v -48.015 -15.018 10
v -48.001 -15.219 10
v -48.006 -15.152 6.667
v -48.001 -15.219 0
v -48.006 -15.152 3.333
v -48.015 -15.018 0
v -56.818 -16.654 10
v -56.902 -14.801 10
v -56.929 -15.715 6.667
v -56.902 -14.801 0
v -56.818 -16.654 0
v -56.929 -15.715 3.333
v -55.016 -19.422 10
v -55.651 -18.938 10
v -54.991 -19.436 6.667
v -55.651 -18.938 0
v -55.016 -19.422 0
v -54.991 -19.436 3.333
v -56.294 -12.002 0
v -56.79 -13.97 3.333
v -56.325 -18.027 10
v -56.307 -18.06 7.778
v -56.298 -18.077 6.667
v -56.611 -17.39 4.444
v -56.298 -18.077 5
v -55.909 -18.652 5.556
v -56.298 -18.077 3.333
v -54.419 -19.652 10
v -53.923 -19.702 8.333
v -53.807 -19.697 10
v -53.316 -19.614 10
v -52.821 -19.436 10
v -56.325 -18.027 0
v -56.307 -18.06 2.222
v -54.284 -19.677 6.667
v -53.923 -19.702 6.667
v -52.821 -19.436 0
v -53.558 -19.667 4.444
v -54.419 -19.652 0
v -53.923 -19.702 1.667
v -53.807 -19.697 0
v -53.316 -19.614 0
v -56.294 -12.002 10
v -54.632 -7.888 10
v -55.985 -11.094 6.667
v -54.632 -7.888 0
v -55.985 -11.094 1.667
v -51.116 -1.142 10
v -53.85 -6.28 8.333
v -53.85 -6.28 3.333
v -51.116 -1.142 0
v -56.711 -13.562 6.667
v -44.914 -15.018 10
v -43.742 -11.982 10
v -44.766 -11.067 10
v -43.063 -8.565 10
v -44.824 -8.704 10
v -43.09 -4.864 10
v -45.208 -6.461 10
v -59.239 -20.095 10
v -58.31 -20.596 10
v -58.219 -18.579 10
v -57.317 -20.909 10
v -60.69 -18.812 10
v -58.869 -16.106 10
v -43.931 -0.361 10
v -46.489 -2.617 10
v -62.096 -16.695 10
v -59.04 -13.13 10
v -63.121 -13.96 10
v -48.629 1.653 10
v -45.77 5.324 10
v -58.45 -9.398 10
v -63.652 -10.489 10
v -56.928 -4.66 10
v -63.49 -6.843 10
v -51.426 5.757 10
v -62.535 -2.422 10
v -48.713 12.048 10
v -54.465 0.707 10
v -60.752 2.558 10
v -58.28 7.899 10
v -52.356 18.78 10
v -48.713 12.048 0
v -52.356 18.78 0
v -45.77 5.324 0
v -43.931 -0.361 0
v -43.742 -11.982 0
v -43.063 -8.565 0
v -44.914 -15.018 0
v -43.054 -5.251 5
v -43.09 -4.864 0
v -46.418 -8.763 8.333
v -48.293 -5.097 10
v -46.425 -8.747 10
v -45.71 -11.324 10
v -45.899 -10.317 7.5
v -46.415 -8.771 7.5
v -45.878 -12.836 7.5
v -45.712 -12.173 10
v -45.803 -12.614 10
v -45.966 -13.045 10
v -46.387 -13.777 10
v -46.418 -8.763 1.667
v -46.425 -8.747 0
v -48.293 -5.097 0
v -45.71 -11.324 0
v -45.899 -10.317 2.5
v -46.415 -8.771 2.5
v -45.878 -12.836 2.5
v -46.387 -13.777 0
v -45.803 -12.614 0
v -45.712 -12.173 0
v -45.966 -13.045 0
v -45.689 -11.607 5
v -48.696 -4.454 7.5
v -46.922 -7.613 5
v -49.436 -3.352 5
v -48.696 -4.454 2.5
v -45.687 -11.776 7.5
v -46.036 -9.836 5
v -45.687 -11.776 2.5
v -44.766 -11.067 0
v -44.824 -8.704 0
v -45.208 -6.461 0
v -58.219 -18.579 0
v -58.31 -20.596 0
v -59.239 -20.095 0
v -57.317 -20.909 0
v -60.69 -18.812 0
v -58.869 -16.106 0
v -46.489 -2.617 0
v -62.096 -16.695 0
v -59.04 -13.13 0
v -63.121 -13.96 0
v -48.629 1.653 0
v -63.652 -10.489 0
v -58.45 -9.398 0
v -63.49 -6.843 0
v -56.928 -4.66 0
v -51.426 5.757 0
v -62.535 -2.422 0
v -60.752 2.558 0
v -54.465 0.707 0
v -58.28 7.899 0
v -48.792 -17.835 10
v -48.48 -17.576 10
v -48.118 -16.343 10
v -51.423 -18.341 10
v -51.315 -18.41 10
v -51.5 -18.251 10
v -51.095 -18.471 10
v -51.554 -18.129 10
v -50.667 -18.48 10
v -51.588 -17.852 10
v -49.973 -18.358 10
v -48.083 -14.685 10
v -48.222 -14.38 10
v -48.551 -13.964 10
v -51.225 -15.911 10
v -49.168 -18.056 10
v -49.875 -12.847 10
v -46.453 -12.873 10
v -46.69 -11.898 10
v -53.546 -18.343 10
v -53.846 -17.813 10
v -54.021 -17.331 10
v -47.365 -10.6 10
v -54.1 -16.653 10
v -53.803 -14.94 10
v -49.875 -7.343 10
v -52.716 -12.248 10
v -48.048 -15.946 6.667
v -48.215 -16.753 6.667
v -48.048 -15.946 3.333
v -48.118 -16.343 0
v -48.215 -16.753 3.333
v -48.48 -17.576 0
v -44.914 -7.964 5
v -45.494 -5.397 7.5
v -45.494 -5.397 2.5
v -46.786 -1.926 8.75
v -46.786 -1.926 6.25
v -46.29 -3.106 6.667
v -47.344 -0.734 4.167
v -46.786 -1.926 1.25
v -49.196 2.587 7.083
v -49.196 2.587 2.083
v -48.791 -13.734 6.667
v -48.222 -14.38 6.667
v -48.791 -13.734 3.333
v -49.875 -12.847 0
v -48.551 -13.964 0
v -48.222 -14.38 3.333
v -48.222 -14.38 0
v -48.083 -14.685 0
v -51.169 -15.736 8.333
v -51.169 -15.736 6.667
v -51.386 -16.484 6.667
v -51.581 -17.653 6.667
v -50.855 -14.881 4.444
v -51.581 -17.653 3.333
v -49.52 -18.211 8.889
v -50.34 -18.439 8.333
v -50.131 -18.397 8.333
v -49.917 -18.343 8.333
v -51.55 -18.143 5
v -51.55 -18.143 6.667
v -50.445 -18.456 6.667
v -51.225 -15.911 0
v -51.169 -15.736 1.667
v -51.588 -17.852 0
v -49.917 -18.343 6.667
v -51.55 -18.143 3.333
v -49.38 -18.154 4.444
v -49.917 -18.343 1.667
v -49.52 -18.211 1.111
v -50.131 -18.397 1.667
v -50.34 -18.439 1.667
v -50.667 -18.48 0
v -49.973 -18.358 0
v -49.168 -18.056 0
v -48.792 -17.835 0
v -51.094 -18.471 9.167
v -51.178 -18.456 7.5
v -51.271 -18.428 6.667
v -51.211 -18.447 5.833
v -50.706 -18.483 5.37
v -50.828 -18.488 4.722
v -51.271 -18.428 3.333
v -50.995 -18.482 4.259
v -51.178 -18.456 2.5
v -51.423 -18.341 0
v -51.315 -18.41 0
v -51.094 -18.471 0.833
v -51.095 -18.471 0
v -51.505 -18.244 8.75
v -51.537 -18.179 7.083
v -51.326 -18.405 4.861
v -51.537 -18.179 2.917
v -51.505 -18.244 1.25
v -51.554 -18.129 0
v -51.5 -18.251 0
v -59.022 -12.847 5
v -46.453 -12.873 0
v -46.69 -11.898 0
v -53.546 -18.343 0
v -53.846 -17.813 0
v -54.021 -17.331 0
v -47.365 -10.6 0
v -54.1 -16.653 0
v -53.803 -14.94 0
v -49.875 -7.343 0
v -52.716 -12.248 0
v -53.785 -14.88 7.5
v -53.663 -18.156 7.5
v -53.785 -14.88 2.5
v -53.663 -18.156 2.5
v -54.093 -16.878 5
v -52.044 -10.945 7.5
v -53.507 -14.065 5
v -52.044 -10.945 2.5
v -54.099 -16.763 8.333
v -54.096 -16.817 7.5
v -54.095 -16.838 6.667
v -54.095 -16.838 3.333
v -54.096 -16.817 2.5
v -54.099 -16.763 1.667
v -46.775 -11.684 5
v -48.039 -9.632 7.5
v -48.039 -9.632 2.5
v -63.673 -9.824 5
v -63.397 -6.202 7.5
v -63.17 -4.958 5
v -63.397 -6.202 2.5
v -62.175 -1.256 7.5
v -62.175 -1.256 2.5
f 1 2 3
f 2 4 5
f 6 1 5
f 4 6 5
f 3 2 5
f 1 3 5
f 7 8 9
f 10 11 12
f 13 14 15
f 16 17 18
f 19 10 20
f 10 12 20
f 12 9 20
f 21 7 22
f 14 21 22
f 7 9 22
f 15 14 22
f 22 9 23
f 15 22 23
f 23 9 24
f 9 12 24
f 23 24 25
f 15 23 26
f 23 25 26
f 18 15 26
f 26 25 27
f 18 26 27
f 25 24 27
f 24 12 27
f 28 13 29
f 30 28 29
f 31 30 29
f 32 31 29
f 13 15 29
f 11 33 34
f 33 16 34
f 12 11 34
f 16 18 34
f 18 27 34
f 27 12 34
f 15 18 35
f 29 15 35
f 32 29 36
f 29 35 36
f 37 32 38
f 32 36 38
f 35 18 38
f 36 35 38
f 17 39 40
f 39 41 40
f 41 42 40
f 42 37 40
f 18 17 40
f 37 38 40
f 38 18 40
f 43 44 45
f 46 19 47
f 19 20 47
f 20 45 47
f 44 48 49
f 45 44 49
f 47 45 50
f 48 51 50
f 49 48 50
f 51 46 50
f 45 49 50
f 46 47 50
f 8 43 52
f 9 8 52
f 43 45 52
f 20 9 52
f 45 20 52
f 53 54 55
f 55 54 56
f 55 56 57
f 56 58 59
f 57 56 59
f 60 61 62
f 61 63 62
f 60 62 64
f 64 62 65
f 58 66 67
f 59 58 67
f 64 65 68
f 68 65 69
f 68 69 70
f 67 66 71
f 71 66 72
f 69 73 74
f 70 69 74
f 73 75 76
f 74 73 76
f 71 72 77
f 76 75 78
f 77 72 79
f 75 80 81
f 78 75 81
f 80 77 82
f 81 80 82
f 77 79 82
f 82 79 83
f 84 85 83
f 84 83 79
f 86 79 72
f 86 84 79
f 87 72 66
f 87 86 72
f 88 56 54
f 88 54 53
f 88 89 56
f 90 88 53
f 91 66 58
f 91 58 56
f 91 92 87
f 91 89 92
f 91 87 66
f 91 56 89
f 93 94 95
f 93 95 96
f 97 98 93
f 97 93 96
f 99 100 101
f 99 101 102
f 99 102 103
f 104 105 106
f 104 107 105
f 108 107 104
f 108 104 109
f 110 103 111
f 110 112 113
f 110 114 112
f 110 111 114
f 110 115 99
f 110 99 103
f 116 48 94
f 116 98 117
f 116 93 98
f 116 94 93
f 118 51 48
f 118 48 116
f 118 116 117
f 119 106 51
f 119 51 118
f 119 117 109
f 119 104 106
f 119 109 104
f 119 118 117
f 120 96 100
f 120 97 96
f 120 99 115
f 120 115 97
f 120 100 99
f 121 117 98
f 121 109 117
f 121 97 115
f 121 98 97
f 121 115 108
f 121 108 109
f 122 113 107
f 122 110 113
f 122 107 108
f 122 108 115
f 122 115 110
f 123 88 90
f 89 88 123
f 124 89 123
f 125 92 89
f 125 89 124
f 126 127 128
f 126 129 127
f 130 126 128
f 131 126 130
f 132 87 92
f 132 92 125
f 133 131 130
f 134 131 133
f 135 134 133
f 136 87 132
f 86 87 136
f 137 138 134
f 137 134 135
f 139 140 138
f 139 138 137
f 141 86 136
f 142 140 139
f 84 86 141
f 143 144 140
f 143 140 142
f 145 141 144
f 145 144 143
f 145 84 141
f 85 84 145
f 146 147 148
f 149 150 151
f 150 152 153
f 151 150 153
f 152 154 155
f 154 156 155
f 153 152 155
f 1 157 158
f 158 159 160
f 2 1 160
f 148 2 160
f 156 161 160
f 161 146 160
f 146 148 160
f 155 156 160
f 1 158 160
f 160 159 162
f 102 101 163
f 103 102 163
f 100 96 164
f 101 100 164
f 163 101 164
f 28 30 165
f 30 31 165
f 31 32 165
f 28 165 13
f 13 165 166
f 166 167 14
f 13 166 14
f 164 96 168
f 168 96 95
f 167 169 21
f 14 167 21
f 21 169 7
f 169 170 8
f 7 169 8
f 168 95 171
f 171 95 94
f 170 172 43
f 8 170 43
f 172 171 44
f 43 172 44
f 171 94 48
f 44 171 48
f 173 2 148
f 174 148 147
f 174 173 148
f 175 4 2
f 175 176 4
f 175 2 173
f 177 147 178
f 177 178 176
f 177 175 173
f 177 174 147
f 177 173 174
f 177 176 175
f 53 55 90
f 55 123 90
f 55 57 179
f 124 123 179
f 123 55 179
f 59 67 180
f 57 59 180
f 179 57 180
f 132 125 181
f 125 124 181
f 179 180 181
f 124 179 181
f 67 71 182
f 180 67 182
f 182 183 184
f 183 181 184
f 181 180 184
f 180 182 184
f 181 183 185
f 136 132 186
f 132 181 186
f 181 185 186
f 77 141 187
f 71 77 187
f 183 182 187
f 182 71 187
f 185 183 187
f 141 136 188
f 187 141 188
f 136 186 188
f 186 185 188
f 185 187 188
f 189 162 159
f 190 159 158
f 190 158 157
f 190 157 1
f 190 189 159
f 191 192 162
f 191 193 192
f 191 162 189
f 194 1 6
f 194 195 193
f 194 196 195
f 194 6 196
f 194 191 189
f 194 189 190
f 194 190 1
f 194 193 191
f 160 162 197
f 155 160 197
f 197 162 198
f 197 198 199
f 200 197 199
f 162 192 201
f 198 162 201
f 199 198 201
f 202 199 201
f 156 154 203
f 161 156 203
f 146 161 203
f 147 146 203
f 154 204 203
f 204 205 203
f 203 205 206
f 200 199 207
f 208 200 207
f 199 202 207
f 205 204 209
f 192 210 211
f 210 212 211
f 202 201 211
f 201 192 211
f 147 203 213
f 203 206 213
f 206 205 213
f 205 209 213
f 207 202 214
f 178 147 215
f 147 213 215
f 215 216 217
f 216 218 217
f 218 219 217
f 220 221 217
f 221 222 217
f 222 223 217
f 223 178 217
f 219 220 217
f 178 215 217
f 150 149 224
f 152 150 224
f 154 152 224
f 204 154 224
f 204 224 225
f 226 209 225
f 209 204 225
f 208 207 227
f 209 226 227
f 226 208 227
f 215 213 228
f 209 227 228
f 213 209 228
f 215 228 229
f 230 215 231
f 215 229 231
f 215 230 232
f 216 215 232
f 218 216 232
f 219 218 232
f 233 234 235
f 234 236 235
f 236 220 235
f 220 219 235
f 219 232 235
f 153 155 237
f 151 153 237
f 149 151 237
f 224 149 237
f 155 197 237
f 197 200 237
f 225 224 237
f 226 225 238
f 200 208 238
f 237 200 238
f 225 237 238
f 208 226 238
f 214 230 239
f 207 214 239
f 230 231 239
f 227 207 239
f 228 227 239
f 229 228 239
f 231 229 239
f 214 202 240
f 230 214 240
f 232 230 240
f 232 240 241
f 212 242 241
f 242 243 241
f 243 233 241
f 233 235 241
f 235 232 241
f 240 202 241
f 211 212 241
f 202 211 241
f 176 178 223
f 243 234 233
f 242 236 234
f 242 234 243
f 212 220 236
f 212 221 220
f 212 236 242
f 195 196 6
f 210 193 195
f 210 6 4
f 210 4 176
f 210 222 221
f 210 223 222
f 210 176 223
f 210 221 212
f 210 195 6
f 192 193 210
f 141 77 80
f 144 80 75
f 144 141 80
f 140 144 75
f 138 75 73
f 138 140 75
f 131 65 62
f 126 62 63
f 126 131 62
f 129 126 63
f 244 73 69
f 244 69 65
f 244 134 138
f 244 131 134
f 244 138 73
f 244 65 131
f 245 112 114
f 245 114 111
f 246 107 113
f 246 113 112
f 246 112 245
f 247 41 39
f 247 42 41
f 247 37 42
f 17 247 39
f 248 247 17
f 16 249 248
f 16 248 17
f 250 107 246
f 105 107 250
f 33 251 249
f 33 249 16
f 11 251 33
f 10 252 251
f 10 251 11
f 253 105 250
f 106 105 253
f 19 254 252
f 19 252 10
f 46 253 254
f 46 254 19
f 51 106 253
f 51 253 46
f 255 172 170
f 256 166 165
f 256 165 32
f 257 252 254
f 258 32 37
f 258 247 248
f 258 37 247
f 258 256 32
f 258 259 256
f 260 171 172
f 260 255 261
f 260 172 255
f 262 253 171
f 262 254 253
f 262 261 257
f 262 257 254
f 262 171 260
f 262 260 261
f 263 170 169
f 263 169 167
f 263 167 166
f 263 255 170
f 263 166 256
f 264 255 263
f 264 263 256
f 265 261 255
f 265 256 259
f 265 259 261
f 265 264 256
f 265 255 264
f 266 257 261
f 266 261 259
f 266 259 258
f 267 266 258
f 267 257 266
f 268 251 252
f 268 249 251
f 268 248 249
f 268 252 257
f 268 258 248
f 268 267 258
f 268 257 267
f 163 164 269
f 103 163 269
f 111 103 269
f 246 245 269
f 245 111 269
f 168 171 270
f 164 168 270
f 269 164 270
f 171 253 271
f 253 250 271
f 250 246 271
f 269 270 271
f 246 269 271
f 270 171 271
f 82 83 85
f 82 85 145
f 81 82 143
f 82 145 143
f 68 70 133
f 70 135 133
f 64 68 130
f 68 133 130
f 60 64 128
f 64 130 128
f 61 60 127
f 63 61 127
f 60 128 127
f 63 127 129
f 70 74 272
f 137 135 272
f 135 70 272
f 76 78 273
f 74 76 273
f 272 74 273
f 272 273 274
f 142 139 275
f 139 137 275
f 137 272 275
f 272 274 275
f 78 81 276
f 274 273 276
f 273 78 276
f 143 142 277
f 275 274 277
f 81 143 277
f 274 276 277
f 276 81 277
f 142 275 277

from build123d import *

# Parameters (mm, degrees)
F1_DEPTH = 10


with BuildPart() as f1:
    # F0 (on Top) → F1 (new body)
    with BuildSketch(Plane.XY):
        with BuildLine():
            add(Edge.make_bspline(
                [(-52.3558855057, 18.7795050442), (-47.4479237009, 10.4973188077), (-41.2077429849, -4.5023856475), (-43.6520873473, -12.2564412052), (-44.9143238366, -15.0175821036)],
                knots=[0, 0, 0, 0, 0.6168364814, 1, 1, 1, 1], degree=3))
            add(Edge.make_bspline(
                [(-52.3558855057, 18.7795050442), (-57.9370558262, 8.8574243709), (-67.5663953849, -7.8461265909), (-61.0377043486, -20.1336536556), (-57.3169253767, -20.9088176489)],
                knots=[0, 0, 0, 0, 0.6080836152, 1, 1, 1, 1], degree=3))
            add(Edge.make_bspline(
                [(-51.4256879687, 5.7567739859), (-55.3790181875, 0), (-60.7427232824, -12.5683599261), (-58.3128306392, -18.4721705598), (-57.3169253767, -20.9088176489)],
                knots=[0, 0, 0, 0, 0.6096241329, 1, 1, 1, 1], degree=3))
            add(Edge.make_bspline(
                [(-51.4256879687, 5.7567739859), (-47.9944117315, 1.4104907139), (-43.8064596306, -7.6148778158), (-44.9937747455, -12.792945198), (-44.9143238366, -15.0175821036)],
                knots=[0, 0, 0, 0, 0.5946990697, 1, 1, 1, 1], degree=3))
        make_face()
    extrude(amount=F1_DEPTH)


with BuildPart() as f1b:
    # F0 (on Top) → F1, piece 2 (new body)
    with BuildSketch(Plane.XY):
        with BuildLine():
            add(Edge.make_bspline(
                [(-51.1156246066, -1.1421727249), (-47.8599406779, -5.0955014303), (-44.8619365743, -11.2527871762), (-45.9975858714, -13.1776298191), (-46.3871322572, -13.7773221359)],
                knots=[0, 0, 0, 0, 0.6945515009, 1, 1, 1, 1], degree=3))
            add(Edge.make_bspline(
                [(-51.1156246066, -1.1421727249), (-54.0927626245, -6.5684166216), (-58.6000627072, -14.9886764983), (-55.3127155959, -19.8742326333), (-53.5626104353, -19.768439435), (-52.8209805489, -19.4360092282)],
                knots=[0, 0, 0, 0, 0.529374103, 0.8031081074, 1, 1, 1, 1], degree=3))
            add(Edge.make_bspline(
                [(-49.8753637075, -7.3434729129), (-52.5109171867, -11.3743189722), (-55.1292246794, -16.8376087906), (-53.4411109984, -18.4282977134), (-52.8209805489, -19.4360092282)],
                knots=[0, 0, 0, 0, 0.6563997062, 1, 1, 1, 1], degree=3))
            add(Edge.make_bspline(
                [(-49.8753637075, -7.3434729129), (-48.587773429, -8.8954036254), (-46.4868515082, -11.4276417975), (-46.4149626503, -13.1215558043), (-46.3871322572, -13.7773221359)],
                knots=[0, 0, 0, 0, 0.6128691723, 1, 1, 1, 1], degree=3))
        make_face()
    extrude(amount=F1_DEPTH)


with BuildPart() as f1c:
    # F0 (on Top) → F1, piece 3 (new body)
    with BuildSketch(Plane.XY):
        with BuildLine():
            add(Edge.make_bspline(
                [(-49.8753637075, -12.8471273929), (-48.4800711274, -13.9323538169), (-48.0941728507, -14.3057196723), (-48.0149723589, -15.0175821036)],
                knots=[0, 0, 0, 0, 0.5118541725, 0.5118541725, 0.5118541725, 0.5118541725], degree=3))
            add(Edge.make_bspline(
                [(-49.8753637075, -12.8471273929), (-51.1156246066, -15.0950979441), (-51.680103631, -17.3520157184), (-51.5206212484, -18.8345152572), (-49.1629198322, -18.2734716211), (-48.4800711274, -17.5756178796)],
                knots=[0, 0, 0, 0, 0.3478164855, 0.4885486688, 0.7516486779, 0.7516486779, 0.7516486779, 0.7516486779], degree=3))
            add(Edge.make_bspline(
                [(-48.0008768377, -15.2189599543), (-47.9792773024, -15.8830183498), (-48.1748734676, -16.7679655402), (-48.4800711274, -17.5756178796)],
                knots=[0.5582066502, 0.5582066502, 0.5582066502, 0.5582066502, 1, 1, 1, 1], degree=3))
            add(Edge.make_bspline(
                [(-48.0008768377, -15.2189599543), (-48.0056429614, -15.1518548305), (-48.0104385888, -15.0846922243), (-48.0149723589, -15.0175821036)],
                knots=[0.9823528755, 0.9823528755, 0.9823528755, 0.9823528755, 1, 1, 1, 1], degree=3))
        make_face()
    extrude(amount=F1_DEPTH)


solid = Compound([f1.part, f1b.part, f1c.part])
